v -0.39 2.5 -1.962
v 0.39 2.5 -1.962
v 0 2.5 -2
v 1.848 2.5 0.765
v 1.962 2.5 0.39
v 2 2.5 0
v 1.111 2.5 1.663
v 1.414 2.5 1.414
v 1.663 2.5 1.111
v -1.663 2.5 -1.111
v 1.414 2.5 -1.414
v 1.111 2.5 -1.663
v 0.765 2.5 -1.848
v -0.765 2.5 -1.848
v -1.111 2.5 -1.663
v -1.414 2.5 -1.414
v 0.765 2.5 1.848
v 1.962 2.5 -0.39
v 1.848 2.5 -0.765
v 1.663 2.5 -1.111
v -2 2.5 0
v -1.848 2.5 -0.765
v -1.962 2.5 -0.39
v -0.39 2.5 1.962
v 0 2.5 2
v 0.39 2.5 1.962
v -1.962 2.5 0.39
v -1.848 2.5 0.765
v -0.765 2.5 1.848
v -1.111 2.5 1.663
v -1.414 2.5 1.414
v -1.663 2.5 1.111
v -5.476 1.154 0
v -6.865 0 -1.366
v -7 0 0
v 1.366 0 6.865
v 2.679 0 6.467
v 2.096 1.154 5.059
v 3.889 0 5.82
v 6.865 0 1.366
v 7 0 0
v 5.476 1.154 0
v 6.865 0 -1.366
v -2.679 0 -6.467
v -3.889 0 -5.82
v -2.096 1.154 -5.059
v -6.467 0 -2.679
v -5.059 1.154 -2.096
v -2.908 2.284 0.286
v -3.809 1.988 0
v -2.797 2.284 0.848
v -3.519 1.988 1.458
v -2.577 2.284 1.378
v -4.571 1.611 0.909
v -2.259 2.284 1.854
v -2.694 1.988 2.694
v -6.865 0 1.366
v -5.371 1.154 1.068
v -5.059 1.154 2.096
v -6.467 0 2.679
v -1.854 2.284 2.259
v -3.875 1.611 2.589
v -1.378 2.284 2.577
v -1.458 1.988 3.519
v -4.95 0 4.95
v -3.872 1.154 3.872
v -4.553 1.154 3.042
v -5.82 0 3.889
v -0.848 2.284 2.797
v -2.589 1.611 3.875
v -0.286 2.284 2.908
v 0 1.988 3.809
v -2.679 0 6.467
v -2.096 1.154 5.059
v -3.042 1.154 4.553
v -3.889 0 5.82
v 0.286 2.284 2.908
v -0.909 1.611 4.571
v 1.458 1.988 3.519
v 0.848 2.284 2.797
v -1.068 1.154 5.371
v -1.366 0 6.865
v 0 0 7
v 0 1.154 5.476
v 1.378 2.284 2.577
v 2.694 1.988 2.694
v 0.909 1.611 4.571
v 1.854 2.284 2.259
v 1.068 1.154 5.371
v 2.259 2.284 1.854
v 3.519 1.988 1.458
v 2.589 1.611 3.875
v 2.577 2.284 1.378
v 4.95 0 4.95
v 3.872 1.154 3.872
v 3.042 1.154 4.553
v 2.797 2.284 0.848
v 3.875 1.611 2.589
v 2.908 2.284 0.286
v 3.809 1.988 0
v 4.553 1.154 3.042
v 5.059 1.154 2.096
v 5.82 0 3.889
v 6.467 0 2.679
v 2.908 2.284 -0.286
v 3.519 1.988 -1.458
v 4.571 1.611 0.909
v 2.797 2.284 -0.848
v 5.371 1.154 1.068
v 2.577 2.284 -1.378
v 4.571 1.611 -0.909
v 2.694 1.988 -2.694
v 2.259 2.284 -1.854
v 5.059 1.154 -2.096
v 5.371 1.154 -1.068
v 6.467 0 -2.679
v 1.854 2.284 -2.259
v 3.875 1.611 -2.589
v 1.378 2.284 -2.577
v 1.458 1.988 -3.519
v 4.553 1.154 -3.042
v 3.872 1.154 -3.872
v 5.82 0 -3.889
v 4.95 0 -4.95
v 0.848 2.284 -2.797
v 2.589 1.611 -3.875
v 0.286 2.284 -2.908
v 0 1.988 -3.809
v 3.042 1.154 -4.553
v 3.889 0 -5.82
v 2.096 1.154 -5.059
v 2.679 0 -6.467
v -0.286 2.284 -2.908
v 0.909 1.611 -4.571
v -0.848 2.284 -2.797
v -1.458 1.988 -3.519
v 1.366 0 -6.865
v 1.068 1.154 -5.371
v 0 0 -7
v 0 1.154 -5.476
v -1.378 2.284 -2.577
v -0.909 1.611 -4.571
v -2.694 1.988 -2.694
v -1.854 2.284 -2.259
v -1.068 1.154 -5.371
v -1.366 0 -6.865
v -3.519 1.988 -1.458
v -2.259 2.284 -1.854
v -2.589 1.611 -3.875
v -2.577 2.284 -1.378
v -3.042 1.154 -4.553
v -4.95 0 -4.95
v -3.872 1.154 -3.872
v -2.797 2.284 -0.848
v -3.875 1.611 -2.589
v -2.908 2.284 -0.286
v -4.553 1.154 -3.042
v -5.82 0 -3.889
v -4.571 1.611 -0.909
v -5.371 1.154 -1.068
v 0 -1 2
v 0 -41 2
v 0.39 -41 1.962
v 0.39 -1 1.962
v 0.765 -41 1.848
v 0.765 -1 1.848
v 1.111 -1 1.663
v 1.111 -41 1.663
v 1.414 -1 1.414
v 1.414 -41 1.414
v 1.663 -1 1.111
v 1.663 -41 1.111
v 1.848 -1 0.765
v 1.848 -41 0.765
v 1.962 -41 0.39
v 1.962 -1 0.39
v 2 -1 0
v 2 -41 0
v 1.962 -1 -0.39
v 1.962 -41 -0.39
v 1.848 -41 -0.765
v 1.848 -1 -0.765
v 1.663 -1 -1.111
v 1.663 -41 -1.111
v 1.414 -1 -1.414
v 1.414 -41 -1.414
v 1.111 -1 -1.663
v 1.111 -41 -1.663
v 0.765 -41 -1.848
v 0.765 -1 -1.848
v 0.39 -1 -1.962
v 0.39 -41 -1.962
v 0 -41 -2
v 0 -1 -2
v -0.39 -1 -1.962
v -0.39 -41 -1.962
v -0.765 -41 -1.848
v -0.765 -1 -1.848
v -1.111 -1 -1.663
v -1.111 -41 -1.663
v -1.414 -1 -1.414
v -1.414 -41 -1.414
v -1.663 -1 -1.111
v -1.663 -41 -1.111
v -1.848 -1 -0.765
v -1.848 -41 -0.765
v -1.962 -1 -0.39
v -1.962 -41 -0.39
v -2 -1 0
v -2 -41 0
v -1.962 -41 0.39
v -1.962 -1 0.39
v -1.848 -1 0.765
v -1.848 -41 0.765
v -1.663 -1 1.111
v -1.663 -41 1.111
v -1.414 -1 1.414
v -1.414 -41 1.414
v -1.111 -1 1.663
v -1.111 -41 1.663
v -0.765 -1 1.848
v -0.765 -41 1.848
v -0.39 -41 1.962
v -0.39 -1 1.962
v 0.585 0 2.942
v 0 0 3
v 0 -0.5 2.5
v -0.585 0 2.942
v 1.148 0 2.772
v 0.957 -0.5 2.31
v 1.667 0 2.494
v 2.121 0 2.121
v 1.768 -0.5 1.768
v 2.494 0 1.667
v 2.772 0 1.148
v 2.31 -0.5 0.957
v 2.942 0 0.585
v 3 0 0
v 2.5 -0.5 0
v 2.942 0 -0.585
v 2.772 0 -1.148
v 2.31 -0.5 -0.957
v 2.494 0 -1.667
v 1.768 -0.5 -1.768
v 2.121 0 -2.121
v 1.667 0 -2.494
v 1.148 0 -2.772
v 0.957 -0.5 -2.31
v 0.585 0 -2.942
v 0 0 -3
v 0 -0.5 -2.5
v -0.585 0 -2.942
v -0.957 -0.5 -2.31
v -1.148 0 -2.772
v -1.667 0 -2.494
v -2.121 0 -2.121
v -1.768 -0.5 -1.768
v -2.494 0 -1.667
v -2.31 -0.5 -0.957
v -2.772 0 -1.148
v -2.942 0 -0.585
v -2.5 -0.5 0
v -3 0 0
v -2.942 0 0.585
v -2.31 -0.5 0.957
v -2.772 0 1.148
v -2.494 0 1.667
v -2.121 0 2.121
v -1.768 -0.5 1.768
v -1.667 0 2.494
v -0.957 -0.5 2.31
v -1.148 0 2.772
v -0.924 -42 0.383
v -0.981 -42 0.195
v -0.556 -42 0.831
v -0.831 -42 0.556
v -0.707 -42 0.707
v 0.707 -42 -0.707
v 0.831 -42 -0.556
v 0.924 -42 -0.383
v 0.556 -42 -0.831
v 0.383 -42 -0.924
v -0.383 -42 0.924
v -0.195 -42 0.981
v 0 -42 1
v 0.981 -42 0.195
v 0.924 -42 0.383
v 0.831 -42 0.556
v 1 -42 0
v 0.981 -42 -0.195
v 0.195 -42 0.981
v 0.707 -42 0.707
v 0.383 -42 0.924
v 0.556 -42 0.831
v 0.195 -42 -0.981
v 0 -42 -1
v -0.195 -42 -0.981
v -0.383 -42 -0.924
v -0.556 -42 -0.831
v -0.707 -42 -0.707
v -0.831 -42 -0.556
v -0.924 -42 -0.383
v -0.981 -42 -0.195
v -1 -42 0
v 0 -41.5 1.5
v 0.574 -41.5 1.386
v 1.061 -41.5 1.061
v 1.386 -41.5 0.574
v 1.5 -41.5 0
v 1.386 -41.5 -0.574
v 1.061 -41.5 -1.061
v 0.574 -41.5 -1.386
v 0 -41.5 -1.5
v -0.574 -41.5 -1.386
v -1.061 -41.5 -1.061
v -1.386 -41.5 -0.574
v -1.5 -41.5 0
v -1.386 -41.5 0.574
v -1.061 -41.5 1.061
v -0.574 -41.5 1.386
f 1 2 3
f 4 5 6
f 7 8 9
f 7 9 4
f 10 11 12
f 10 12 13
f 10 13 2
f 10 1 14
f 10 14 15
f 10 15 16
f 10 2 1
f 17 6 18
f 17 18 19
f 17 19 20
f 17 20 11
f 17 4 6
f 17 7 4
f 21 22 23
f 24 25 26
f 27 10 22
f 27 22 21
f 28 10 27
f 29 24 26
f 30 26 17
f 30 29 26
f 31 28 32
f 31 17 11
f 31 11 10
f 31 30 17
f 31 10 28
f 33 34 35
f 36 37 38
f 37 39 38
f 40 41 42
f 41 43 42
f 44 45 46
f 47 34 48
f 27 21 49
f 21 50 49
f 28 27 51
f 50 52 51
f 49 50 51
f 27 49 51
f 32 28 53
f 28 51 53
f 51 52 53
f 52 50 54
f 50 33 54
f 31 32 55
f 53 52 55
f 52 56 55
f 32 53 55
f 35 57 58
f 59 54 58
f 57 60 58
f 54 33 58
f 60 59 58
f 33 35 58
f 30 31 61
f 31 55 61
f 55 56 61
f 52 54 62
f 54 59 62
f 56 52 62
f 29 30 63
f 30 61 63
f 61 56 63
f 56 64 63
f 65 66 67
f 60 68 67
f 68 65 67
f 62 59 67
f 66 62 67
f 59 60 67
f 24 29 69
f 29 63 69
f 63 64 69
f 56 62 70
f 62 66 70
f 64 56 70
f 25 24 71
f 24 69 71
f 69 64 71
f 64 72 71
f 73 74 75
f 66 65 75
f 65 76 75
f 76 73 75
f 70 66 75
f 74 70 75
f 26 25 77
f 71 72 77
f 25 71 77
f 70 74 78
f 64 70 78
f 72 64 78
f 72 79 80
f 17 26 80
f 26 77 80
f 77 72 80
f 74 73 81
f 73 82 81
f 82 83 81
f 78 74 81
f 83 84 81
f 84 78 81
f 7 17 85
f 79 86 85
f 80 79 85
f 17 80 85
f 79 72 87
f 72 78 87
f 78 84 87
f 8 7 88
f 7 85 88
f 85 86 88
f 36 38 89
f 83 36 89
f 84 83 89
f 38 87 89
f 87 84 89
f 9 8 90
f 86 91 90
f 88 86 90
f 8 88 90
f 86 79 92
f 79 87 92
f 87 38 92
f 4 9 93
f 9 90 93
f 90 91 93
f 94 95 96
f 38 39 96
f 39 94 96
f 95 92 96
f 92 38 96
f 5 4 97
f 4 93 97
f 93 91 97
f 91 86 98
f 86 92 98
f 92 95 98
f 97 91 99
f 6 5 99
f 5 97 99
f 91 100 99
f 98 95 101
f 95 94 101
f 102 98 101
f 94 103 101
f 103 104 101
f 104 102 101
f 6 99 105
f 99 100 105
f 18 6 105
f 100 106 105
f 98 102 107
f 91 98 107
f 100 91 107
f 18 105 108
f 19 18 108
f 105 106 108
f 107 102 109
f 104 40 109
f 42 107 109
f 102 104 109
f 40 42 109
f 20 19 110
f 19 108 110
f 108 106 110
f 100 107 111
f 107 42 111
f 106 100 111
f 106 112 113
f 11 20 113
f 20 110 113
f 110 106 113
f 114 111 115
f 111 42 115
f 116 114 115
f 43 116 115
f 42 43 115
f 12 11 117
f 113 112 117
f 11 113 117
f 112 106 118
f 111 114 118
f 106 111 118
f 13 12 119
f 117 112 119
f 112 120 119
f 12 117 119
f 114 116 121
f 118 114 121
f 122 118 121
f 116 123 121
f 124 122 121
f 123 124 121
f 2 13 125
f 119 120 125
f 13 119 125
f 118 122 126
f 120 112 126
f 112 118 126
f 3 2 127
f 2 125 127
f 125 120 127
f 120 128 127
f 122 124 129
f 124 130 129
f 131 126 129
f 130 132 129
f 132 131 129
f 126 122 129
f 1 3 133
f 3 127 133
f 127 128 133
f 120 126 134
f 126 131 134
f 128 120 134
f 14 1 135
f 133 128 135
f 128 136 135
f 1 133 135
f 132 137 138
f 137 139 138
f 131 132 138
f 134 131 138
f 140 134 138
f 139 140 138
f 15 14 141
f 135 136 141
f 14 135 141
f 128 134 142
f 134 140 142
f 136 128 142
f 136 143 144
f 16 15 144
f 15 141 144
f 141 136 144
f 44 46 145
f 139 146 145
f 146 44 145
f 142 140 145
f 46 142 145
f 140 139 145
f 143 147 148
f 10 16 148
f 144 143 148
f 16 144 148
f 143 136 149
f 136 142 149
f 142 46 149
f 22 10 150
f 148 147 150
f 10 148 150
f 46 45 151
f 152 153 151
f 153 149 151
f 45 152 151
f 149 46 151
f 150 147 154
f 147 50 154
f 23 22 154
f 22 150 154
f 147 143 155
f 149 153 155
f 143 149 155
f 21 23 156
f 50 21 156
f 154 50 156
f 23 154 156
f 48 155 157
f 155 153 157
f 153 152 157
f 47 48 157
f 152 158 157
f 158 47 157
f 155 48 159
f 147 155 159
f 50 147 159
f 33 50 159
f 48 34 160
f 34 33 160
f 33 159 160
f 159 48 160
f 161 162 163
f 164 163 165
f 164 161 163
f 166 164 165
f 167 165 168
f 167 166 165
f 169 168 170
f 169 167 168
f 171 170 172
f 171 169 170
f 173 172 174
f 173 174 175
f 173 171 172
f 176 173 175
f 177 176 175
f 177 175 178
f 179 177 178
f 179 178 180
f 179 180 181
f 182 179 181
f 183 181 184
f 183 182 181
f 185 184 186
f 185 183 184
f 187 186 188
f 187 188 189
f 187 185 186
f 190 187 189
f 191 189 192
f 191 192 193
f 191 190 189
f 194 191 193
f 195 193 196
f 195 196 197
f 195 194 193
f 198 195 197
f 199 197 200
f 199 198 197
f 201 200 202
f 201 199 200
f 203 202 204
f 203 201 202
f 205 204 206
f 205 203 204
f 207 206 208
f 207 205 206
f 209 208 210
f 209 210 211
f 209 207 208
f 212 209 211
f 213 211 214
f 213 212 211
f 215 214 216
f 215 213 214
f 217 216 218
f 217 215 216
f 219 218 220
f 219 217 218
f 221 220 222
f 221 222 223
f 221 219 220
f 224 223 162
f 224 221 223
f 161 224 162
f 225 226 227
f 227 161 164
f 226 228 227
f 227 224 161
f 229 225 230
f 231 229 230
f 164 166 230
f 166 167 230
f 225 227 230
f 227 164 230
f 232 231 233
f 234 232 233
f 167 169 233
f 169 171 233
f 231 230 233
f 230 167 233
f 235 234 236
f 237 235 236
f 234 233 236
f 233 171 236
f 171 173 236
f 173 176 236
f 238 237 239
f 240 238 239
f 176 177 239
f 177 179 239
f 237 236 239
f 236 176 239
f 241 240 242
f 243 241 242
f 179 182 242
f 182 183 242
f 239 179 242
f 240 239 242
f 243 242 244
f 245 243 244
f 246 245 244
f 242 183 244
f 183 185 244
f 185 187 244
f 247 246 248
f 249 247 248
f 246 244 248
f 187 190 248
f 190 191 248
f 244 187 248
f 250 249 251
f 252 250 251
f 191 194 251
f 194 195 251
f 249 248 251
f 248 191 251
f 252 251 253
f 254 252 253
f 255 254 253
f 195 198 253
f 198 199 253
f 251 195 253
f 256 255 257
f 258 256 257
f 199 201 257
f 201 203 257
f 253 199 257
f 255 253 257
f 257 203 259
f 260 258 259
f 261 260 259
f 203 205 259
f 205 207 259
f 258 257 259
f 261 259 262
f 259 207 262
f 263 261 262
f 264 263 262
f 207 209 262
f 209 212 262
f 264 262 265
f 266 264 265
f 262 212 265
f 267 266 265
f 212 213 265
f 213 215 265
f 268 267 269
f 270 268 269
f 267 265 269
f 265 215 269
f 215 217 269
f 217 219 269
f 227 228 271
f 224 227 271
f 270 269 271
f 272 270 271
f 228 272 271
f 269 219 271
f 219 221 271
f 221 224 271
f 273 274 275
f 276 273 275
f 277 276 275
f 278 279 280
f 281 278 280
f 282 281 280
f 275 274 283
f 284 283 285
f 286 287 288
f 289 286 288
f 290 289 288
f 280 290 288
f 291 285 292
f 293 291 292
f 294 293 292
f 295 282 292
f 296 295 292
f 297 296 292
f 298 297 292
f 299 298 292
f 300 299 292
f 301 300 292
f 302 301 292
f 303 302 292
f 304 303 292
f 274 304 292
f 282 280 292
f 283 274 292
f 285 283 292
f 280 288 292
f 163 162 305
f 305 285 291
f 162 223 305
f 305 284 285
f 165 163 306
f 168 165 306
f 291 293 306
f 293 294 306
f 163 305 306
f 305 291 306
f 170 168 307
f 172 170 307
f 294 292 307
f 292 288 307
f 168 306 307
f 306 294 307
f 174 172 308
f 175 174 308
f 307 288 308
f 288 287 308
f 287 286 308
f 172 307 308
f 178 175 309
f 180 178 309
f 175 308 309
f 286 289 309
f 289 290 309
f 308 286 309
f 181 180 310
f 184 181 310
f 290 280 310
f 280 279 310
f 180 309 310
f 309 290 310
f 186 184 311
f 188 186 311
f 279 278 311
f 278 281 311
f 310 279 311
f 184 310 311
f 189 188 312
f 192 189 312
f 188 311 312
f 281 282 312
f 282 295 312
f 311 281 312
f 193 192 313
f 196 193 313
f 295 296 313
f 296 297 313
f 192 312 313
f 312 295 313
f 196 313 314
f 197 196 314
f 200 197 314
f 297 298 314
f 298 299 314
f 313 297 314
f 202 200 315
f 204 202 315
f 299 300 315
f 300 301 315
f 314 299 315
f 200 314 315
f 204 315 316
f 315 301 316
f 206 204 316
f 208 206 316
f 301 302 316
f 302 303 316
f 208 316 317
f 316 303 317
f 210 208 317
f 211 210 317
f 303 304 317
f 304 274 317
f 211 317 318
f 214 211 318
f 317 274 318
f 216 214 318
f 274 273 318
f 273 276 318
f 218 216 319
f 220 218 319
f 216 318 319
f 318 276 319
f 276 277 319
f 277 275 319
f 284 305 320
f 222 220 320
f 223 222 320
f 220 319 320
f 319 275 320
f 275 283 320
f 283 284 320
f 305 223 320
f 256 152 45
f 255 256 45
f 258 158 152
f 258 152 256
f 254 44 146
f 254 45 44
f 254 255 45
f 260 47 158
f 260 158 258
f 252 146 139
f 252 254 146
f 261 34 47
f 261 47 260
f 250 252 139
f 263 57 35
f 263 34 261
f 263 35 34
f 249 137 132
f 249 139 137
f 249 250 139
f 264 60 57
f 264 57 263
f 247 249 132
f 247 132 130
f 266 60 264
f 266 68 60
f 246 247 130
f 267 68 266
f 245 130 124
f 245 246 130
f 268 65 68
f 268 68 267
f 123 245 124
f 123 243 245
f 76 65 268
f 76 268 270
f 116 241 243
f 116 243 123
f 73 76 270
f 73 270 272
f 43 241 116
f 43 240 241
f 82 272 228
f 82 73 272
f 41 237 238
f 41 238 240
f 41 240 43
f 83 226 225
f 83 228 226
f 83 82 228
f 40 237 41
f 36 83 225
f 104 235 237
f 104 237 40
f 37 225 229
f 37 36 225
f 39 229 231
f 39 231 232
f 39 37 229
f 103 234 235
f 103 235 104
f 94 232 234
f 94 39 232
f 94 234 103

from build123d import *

# Parameters (mm, degrees)
SKETCH_19_R     = 2
EXTRUDE_1_DEPTH = 42
CHAMFER_1_SIZE  = 1


with BuildPart() as part:
    # 草图16 → 旋转1 (revolve)
    with BuildSketch(Plane.XY):
        with BuildLine():
            Line((0, 0), (-7, 0))
            add(Edge.make_bspline(
                [(-2, 2.5), (-4.820865147, 1.972200791), (-7, 0)],
                knots=[0, 0, 0, 1, 1, 1], degree=2))
            Line((-2, 2.5), (0, 2.5))
            Line((0, 2.5), (0, 0))
        make_face()
    revolve(axis=Axis((0, 0, 0), (0, 1, 0)))

    # 草图19 → 凸台-拉伸1 (add)
    with BuildSketch(Plane(origin=(0, 0, 0), x_dir=(1, 0, 0), z_dir=(0, 1, 0))):
        with Locations(Location((0, 0, 0), (0, 0, 270))):
            Circle(SKETCH_19_R)
    extrude(amount=-EXTRUDE_1_DEPTH)

    # 倒角1
    chamfer_1_edges = [part.edges().sort_by_distance(p)[0] for p in [
        (0, -42, -2),
        (0, 0, -2),
    ]]
    chamfer(chamfer_1_edges, length=CHAMFER_1_SIZE)


solid = part.part
